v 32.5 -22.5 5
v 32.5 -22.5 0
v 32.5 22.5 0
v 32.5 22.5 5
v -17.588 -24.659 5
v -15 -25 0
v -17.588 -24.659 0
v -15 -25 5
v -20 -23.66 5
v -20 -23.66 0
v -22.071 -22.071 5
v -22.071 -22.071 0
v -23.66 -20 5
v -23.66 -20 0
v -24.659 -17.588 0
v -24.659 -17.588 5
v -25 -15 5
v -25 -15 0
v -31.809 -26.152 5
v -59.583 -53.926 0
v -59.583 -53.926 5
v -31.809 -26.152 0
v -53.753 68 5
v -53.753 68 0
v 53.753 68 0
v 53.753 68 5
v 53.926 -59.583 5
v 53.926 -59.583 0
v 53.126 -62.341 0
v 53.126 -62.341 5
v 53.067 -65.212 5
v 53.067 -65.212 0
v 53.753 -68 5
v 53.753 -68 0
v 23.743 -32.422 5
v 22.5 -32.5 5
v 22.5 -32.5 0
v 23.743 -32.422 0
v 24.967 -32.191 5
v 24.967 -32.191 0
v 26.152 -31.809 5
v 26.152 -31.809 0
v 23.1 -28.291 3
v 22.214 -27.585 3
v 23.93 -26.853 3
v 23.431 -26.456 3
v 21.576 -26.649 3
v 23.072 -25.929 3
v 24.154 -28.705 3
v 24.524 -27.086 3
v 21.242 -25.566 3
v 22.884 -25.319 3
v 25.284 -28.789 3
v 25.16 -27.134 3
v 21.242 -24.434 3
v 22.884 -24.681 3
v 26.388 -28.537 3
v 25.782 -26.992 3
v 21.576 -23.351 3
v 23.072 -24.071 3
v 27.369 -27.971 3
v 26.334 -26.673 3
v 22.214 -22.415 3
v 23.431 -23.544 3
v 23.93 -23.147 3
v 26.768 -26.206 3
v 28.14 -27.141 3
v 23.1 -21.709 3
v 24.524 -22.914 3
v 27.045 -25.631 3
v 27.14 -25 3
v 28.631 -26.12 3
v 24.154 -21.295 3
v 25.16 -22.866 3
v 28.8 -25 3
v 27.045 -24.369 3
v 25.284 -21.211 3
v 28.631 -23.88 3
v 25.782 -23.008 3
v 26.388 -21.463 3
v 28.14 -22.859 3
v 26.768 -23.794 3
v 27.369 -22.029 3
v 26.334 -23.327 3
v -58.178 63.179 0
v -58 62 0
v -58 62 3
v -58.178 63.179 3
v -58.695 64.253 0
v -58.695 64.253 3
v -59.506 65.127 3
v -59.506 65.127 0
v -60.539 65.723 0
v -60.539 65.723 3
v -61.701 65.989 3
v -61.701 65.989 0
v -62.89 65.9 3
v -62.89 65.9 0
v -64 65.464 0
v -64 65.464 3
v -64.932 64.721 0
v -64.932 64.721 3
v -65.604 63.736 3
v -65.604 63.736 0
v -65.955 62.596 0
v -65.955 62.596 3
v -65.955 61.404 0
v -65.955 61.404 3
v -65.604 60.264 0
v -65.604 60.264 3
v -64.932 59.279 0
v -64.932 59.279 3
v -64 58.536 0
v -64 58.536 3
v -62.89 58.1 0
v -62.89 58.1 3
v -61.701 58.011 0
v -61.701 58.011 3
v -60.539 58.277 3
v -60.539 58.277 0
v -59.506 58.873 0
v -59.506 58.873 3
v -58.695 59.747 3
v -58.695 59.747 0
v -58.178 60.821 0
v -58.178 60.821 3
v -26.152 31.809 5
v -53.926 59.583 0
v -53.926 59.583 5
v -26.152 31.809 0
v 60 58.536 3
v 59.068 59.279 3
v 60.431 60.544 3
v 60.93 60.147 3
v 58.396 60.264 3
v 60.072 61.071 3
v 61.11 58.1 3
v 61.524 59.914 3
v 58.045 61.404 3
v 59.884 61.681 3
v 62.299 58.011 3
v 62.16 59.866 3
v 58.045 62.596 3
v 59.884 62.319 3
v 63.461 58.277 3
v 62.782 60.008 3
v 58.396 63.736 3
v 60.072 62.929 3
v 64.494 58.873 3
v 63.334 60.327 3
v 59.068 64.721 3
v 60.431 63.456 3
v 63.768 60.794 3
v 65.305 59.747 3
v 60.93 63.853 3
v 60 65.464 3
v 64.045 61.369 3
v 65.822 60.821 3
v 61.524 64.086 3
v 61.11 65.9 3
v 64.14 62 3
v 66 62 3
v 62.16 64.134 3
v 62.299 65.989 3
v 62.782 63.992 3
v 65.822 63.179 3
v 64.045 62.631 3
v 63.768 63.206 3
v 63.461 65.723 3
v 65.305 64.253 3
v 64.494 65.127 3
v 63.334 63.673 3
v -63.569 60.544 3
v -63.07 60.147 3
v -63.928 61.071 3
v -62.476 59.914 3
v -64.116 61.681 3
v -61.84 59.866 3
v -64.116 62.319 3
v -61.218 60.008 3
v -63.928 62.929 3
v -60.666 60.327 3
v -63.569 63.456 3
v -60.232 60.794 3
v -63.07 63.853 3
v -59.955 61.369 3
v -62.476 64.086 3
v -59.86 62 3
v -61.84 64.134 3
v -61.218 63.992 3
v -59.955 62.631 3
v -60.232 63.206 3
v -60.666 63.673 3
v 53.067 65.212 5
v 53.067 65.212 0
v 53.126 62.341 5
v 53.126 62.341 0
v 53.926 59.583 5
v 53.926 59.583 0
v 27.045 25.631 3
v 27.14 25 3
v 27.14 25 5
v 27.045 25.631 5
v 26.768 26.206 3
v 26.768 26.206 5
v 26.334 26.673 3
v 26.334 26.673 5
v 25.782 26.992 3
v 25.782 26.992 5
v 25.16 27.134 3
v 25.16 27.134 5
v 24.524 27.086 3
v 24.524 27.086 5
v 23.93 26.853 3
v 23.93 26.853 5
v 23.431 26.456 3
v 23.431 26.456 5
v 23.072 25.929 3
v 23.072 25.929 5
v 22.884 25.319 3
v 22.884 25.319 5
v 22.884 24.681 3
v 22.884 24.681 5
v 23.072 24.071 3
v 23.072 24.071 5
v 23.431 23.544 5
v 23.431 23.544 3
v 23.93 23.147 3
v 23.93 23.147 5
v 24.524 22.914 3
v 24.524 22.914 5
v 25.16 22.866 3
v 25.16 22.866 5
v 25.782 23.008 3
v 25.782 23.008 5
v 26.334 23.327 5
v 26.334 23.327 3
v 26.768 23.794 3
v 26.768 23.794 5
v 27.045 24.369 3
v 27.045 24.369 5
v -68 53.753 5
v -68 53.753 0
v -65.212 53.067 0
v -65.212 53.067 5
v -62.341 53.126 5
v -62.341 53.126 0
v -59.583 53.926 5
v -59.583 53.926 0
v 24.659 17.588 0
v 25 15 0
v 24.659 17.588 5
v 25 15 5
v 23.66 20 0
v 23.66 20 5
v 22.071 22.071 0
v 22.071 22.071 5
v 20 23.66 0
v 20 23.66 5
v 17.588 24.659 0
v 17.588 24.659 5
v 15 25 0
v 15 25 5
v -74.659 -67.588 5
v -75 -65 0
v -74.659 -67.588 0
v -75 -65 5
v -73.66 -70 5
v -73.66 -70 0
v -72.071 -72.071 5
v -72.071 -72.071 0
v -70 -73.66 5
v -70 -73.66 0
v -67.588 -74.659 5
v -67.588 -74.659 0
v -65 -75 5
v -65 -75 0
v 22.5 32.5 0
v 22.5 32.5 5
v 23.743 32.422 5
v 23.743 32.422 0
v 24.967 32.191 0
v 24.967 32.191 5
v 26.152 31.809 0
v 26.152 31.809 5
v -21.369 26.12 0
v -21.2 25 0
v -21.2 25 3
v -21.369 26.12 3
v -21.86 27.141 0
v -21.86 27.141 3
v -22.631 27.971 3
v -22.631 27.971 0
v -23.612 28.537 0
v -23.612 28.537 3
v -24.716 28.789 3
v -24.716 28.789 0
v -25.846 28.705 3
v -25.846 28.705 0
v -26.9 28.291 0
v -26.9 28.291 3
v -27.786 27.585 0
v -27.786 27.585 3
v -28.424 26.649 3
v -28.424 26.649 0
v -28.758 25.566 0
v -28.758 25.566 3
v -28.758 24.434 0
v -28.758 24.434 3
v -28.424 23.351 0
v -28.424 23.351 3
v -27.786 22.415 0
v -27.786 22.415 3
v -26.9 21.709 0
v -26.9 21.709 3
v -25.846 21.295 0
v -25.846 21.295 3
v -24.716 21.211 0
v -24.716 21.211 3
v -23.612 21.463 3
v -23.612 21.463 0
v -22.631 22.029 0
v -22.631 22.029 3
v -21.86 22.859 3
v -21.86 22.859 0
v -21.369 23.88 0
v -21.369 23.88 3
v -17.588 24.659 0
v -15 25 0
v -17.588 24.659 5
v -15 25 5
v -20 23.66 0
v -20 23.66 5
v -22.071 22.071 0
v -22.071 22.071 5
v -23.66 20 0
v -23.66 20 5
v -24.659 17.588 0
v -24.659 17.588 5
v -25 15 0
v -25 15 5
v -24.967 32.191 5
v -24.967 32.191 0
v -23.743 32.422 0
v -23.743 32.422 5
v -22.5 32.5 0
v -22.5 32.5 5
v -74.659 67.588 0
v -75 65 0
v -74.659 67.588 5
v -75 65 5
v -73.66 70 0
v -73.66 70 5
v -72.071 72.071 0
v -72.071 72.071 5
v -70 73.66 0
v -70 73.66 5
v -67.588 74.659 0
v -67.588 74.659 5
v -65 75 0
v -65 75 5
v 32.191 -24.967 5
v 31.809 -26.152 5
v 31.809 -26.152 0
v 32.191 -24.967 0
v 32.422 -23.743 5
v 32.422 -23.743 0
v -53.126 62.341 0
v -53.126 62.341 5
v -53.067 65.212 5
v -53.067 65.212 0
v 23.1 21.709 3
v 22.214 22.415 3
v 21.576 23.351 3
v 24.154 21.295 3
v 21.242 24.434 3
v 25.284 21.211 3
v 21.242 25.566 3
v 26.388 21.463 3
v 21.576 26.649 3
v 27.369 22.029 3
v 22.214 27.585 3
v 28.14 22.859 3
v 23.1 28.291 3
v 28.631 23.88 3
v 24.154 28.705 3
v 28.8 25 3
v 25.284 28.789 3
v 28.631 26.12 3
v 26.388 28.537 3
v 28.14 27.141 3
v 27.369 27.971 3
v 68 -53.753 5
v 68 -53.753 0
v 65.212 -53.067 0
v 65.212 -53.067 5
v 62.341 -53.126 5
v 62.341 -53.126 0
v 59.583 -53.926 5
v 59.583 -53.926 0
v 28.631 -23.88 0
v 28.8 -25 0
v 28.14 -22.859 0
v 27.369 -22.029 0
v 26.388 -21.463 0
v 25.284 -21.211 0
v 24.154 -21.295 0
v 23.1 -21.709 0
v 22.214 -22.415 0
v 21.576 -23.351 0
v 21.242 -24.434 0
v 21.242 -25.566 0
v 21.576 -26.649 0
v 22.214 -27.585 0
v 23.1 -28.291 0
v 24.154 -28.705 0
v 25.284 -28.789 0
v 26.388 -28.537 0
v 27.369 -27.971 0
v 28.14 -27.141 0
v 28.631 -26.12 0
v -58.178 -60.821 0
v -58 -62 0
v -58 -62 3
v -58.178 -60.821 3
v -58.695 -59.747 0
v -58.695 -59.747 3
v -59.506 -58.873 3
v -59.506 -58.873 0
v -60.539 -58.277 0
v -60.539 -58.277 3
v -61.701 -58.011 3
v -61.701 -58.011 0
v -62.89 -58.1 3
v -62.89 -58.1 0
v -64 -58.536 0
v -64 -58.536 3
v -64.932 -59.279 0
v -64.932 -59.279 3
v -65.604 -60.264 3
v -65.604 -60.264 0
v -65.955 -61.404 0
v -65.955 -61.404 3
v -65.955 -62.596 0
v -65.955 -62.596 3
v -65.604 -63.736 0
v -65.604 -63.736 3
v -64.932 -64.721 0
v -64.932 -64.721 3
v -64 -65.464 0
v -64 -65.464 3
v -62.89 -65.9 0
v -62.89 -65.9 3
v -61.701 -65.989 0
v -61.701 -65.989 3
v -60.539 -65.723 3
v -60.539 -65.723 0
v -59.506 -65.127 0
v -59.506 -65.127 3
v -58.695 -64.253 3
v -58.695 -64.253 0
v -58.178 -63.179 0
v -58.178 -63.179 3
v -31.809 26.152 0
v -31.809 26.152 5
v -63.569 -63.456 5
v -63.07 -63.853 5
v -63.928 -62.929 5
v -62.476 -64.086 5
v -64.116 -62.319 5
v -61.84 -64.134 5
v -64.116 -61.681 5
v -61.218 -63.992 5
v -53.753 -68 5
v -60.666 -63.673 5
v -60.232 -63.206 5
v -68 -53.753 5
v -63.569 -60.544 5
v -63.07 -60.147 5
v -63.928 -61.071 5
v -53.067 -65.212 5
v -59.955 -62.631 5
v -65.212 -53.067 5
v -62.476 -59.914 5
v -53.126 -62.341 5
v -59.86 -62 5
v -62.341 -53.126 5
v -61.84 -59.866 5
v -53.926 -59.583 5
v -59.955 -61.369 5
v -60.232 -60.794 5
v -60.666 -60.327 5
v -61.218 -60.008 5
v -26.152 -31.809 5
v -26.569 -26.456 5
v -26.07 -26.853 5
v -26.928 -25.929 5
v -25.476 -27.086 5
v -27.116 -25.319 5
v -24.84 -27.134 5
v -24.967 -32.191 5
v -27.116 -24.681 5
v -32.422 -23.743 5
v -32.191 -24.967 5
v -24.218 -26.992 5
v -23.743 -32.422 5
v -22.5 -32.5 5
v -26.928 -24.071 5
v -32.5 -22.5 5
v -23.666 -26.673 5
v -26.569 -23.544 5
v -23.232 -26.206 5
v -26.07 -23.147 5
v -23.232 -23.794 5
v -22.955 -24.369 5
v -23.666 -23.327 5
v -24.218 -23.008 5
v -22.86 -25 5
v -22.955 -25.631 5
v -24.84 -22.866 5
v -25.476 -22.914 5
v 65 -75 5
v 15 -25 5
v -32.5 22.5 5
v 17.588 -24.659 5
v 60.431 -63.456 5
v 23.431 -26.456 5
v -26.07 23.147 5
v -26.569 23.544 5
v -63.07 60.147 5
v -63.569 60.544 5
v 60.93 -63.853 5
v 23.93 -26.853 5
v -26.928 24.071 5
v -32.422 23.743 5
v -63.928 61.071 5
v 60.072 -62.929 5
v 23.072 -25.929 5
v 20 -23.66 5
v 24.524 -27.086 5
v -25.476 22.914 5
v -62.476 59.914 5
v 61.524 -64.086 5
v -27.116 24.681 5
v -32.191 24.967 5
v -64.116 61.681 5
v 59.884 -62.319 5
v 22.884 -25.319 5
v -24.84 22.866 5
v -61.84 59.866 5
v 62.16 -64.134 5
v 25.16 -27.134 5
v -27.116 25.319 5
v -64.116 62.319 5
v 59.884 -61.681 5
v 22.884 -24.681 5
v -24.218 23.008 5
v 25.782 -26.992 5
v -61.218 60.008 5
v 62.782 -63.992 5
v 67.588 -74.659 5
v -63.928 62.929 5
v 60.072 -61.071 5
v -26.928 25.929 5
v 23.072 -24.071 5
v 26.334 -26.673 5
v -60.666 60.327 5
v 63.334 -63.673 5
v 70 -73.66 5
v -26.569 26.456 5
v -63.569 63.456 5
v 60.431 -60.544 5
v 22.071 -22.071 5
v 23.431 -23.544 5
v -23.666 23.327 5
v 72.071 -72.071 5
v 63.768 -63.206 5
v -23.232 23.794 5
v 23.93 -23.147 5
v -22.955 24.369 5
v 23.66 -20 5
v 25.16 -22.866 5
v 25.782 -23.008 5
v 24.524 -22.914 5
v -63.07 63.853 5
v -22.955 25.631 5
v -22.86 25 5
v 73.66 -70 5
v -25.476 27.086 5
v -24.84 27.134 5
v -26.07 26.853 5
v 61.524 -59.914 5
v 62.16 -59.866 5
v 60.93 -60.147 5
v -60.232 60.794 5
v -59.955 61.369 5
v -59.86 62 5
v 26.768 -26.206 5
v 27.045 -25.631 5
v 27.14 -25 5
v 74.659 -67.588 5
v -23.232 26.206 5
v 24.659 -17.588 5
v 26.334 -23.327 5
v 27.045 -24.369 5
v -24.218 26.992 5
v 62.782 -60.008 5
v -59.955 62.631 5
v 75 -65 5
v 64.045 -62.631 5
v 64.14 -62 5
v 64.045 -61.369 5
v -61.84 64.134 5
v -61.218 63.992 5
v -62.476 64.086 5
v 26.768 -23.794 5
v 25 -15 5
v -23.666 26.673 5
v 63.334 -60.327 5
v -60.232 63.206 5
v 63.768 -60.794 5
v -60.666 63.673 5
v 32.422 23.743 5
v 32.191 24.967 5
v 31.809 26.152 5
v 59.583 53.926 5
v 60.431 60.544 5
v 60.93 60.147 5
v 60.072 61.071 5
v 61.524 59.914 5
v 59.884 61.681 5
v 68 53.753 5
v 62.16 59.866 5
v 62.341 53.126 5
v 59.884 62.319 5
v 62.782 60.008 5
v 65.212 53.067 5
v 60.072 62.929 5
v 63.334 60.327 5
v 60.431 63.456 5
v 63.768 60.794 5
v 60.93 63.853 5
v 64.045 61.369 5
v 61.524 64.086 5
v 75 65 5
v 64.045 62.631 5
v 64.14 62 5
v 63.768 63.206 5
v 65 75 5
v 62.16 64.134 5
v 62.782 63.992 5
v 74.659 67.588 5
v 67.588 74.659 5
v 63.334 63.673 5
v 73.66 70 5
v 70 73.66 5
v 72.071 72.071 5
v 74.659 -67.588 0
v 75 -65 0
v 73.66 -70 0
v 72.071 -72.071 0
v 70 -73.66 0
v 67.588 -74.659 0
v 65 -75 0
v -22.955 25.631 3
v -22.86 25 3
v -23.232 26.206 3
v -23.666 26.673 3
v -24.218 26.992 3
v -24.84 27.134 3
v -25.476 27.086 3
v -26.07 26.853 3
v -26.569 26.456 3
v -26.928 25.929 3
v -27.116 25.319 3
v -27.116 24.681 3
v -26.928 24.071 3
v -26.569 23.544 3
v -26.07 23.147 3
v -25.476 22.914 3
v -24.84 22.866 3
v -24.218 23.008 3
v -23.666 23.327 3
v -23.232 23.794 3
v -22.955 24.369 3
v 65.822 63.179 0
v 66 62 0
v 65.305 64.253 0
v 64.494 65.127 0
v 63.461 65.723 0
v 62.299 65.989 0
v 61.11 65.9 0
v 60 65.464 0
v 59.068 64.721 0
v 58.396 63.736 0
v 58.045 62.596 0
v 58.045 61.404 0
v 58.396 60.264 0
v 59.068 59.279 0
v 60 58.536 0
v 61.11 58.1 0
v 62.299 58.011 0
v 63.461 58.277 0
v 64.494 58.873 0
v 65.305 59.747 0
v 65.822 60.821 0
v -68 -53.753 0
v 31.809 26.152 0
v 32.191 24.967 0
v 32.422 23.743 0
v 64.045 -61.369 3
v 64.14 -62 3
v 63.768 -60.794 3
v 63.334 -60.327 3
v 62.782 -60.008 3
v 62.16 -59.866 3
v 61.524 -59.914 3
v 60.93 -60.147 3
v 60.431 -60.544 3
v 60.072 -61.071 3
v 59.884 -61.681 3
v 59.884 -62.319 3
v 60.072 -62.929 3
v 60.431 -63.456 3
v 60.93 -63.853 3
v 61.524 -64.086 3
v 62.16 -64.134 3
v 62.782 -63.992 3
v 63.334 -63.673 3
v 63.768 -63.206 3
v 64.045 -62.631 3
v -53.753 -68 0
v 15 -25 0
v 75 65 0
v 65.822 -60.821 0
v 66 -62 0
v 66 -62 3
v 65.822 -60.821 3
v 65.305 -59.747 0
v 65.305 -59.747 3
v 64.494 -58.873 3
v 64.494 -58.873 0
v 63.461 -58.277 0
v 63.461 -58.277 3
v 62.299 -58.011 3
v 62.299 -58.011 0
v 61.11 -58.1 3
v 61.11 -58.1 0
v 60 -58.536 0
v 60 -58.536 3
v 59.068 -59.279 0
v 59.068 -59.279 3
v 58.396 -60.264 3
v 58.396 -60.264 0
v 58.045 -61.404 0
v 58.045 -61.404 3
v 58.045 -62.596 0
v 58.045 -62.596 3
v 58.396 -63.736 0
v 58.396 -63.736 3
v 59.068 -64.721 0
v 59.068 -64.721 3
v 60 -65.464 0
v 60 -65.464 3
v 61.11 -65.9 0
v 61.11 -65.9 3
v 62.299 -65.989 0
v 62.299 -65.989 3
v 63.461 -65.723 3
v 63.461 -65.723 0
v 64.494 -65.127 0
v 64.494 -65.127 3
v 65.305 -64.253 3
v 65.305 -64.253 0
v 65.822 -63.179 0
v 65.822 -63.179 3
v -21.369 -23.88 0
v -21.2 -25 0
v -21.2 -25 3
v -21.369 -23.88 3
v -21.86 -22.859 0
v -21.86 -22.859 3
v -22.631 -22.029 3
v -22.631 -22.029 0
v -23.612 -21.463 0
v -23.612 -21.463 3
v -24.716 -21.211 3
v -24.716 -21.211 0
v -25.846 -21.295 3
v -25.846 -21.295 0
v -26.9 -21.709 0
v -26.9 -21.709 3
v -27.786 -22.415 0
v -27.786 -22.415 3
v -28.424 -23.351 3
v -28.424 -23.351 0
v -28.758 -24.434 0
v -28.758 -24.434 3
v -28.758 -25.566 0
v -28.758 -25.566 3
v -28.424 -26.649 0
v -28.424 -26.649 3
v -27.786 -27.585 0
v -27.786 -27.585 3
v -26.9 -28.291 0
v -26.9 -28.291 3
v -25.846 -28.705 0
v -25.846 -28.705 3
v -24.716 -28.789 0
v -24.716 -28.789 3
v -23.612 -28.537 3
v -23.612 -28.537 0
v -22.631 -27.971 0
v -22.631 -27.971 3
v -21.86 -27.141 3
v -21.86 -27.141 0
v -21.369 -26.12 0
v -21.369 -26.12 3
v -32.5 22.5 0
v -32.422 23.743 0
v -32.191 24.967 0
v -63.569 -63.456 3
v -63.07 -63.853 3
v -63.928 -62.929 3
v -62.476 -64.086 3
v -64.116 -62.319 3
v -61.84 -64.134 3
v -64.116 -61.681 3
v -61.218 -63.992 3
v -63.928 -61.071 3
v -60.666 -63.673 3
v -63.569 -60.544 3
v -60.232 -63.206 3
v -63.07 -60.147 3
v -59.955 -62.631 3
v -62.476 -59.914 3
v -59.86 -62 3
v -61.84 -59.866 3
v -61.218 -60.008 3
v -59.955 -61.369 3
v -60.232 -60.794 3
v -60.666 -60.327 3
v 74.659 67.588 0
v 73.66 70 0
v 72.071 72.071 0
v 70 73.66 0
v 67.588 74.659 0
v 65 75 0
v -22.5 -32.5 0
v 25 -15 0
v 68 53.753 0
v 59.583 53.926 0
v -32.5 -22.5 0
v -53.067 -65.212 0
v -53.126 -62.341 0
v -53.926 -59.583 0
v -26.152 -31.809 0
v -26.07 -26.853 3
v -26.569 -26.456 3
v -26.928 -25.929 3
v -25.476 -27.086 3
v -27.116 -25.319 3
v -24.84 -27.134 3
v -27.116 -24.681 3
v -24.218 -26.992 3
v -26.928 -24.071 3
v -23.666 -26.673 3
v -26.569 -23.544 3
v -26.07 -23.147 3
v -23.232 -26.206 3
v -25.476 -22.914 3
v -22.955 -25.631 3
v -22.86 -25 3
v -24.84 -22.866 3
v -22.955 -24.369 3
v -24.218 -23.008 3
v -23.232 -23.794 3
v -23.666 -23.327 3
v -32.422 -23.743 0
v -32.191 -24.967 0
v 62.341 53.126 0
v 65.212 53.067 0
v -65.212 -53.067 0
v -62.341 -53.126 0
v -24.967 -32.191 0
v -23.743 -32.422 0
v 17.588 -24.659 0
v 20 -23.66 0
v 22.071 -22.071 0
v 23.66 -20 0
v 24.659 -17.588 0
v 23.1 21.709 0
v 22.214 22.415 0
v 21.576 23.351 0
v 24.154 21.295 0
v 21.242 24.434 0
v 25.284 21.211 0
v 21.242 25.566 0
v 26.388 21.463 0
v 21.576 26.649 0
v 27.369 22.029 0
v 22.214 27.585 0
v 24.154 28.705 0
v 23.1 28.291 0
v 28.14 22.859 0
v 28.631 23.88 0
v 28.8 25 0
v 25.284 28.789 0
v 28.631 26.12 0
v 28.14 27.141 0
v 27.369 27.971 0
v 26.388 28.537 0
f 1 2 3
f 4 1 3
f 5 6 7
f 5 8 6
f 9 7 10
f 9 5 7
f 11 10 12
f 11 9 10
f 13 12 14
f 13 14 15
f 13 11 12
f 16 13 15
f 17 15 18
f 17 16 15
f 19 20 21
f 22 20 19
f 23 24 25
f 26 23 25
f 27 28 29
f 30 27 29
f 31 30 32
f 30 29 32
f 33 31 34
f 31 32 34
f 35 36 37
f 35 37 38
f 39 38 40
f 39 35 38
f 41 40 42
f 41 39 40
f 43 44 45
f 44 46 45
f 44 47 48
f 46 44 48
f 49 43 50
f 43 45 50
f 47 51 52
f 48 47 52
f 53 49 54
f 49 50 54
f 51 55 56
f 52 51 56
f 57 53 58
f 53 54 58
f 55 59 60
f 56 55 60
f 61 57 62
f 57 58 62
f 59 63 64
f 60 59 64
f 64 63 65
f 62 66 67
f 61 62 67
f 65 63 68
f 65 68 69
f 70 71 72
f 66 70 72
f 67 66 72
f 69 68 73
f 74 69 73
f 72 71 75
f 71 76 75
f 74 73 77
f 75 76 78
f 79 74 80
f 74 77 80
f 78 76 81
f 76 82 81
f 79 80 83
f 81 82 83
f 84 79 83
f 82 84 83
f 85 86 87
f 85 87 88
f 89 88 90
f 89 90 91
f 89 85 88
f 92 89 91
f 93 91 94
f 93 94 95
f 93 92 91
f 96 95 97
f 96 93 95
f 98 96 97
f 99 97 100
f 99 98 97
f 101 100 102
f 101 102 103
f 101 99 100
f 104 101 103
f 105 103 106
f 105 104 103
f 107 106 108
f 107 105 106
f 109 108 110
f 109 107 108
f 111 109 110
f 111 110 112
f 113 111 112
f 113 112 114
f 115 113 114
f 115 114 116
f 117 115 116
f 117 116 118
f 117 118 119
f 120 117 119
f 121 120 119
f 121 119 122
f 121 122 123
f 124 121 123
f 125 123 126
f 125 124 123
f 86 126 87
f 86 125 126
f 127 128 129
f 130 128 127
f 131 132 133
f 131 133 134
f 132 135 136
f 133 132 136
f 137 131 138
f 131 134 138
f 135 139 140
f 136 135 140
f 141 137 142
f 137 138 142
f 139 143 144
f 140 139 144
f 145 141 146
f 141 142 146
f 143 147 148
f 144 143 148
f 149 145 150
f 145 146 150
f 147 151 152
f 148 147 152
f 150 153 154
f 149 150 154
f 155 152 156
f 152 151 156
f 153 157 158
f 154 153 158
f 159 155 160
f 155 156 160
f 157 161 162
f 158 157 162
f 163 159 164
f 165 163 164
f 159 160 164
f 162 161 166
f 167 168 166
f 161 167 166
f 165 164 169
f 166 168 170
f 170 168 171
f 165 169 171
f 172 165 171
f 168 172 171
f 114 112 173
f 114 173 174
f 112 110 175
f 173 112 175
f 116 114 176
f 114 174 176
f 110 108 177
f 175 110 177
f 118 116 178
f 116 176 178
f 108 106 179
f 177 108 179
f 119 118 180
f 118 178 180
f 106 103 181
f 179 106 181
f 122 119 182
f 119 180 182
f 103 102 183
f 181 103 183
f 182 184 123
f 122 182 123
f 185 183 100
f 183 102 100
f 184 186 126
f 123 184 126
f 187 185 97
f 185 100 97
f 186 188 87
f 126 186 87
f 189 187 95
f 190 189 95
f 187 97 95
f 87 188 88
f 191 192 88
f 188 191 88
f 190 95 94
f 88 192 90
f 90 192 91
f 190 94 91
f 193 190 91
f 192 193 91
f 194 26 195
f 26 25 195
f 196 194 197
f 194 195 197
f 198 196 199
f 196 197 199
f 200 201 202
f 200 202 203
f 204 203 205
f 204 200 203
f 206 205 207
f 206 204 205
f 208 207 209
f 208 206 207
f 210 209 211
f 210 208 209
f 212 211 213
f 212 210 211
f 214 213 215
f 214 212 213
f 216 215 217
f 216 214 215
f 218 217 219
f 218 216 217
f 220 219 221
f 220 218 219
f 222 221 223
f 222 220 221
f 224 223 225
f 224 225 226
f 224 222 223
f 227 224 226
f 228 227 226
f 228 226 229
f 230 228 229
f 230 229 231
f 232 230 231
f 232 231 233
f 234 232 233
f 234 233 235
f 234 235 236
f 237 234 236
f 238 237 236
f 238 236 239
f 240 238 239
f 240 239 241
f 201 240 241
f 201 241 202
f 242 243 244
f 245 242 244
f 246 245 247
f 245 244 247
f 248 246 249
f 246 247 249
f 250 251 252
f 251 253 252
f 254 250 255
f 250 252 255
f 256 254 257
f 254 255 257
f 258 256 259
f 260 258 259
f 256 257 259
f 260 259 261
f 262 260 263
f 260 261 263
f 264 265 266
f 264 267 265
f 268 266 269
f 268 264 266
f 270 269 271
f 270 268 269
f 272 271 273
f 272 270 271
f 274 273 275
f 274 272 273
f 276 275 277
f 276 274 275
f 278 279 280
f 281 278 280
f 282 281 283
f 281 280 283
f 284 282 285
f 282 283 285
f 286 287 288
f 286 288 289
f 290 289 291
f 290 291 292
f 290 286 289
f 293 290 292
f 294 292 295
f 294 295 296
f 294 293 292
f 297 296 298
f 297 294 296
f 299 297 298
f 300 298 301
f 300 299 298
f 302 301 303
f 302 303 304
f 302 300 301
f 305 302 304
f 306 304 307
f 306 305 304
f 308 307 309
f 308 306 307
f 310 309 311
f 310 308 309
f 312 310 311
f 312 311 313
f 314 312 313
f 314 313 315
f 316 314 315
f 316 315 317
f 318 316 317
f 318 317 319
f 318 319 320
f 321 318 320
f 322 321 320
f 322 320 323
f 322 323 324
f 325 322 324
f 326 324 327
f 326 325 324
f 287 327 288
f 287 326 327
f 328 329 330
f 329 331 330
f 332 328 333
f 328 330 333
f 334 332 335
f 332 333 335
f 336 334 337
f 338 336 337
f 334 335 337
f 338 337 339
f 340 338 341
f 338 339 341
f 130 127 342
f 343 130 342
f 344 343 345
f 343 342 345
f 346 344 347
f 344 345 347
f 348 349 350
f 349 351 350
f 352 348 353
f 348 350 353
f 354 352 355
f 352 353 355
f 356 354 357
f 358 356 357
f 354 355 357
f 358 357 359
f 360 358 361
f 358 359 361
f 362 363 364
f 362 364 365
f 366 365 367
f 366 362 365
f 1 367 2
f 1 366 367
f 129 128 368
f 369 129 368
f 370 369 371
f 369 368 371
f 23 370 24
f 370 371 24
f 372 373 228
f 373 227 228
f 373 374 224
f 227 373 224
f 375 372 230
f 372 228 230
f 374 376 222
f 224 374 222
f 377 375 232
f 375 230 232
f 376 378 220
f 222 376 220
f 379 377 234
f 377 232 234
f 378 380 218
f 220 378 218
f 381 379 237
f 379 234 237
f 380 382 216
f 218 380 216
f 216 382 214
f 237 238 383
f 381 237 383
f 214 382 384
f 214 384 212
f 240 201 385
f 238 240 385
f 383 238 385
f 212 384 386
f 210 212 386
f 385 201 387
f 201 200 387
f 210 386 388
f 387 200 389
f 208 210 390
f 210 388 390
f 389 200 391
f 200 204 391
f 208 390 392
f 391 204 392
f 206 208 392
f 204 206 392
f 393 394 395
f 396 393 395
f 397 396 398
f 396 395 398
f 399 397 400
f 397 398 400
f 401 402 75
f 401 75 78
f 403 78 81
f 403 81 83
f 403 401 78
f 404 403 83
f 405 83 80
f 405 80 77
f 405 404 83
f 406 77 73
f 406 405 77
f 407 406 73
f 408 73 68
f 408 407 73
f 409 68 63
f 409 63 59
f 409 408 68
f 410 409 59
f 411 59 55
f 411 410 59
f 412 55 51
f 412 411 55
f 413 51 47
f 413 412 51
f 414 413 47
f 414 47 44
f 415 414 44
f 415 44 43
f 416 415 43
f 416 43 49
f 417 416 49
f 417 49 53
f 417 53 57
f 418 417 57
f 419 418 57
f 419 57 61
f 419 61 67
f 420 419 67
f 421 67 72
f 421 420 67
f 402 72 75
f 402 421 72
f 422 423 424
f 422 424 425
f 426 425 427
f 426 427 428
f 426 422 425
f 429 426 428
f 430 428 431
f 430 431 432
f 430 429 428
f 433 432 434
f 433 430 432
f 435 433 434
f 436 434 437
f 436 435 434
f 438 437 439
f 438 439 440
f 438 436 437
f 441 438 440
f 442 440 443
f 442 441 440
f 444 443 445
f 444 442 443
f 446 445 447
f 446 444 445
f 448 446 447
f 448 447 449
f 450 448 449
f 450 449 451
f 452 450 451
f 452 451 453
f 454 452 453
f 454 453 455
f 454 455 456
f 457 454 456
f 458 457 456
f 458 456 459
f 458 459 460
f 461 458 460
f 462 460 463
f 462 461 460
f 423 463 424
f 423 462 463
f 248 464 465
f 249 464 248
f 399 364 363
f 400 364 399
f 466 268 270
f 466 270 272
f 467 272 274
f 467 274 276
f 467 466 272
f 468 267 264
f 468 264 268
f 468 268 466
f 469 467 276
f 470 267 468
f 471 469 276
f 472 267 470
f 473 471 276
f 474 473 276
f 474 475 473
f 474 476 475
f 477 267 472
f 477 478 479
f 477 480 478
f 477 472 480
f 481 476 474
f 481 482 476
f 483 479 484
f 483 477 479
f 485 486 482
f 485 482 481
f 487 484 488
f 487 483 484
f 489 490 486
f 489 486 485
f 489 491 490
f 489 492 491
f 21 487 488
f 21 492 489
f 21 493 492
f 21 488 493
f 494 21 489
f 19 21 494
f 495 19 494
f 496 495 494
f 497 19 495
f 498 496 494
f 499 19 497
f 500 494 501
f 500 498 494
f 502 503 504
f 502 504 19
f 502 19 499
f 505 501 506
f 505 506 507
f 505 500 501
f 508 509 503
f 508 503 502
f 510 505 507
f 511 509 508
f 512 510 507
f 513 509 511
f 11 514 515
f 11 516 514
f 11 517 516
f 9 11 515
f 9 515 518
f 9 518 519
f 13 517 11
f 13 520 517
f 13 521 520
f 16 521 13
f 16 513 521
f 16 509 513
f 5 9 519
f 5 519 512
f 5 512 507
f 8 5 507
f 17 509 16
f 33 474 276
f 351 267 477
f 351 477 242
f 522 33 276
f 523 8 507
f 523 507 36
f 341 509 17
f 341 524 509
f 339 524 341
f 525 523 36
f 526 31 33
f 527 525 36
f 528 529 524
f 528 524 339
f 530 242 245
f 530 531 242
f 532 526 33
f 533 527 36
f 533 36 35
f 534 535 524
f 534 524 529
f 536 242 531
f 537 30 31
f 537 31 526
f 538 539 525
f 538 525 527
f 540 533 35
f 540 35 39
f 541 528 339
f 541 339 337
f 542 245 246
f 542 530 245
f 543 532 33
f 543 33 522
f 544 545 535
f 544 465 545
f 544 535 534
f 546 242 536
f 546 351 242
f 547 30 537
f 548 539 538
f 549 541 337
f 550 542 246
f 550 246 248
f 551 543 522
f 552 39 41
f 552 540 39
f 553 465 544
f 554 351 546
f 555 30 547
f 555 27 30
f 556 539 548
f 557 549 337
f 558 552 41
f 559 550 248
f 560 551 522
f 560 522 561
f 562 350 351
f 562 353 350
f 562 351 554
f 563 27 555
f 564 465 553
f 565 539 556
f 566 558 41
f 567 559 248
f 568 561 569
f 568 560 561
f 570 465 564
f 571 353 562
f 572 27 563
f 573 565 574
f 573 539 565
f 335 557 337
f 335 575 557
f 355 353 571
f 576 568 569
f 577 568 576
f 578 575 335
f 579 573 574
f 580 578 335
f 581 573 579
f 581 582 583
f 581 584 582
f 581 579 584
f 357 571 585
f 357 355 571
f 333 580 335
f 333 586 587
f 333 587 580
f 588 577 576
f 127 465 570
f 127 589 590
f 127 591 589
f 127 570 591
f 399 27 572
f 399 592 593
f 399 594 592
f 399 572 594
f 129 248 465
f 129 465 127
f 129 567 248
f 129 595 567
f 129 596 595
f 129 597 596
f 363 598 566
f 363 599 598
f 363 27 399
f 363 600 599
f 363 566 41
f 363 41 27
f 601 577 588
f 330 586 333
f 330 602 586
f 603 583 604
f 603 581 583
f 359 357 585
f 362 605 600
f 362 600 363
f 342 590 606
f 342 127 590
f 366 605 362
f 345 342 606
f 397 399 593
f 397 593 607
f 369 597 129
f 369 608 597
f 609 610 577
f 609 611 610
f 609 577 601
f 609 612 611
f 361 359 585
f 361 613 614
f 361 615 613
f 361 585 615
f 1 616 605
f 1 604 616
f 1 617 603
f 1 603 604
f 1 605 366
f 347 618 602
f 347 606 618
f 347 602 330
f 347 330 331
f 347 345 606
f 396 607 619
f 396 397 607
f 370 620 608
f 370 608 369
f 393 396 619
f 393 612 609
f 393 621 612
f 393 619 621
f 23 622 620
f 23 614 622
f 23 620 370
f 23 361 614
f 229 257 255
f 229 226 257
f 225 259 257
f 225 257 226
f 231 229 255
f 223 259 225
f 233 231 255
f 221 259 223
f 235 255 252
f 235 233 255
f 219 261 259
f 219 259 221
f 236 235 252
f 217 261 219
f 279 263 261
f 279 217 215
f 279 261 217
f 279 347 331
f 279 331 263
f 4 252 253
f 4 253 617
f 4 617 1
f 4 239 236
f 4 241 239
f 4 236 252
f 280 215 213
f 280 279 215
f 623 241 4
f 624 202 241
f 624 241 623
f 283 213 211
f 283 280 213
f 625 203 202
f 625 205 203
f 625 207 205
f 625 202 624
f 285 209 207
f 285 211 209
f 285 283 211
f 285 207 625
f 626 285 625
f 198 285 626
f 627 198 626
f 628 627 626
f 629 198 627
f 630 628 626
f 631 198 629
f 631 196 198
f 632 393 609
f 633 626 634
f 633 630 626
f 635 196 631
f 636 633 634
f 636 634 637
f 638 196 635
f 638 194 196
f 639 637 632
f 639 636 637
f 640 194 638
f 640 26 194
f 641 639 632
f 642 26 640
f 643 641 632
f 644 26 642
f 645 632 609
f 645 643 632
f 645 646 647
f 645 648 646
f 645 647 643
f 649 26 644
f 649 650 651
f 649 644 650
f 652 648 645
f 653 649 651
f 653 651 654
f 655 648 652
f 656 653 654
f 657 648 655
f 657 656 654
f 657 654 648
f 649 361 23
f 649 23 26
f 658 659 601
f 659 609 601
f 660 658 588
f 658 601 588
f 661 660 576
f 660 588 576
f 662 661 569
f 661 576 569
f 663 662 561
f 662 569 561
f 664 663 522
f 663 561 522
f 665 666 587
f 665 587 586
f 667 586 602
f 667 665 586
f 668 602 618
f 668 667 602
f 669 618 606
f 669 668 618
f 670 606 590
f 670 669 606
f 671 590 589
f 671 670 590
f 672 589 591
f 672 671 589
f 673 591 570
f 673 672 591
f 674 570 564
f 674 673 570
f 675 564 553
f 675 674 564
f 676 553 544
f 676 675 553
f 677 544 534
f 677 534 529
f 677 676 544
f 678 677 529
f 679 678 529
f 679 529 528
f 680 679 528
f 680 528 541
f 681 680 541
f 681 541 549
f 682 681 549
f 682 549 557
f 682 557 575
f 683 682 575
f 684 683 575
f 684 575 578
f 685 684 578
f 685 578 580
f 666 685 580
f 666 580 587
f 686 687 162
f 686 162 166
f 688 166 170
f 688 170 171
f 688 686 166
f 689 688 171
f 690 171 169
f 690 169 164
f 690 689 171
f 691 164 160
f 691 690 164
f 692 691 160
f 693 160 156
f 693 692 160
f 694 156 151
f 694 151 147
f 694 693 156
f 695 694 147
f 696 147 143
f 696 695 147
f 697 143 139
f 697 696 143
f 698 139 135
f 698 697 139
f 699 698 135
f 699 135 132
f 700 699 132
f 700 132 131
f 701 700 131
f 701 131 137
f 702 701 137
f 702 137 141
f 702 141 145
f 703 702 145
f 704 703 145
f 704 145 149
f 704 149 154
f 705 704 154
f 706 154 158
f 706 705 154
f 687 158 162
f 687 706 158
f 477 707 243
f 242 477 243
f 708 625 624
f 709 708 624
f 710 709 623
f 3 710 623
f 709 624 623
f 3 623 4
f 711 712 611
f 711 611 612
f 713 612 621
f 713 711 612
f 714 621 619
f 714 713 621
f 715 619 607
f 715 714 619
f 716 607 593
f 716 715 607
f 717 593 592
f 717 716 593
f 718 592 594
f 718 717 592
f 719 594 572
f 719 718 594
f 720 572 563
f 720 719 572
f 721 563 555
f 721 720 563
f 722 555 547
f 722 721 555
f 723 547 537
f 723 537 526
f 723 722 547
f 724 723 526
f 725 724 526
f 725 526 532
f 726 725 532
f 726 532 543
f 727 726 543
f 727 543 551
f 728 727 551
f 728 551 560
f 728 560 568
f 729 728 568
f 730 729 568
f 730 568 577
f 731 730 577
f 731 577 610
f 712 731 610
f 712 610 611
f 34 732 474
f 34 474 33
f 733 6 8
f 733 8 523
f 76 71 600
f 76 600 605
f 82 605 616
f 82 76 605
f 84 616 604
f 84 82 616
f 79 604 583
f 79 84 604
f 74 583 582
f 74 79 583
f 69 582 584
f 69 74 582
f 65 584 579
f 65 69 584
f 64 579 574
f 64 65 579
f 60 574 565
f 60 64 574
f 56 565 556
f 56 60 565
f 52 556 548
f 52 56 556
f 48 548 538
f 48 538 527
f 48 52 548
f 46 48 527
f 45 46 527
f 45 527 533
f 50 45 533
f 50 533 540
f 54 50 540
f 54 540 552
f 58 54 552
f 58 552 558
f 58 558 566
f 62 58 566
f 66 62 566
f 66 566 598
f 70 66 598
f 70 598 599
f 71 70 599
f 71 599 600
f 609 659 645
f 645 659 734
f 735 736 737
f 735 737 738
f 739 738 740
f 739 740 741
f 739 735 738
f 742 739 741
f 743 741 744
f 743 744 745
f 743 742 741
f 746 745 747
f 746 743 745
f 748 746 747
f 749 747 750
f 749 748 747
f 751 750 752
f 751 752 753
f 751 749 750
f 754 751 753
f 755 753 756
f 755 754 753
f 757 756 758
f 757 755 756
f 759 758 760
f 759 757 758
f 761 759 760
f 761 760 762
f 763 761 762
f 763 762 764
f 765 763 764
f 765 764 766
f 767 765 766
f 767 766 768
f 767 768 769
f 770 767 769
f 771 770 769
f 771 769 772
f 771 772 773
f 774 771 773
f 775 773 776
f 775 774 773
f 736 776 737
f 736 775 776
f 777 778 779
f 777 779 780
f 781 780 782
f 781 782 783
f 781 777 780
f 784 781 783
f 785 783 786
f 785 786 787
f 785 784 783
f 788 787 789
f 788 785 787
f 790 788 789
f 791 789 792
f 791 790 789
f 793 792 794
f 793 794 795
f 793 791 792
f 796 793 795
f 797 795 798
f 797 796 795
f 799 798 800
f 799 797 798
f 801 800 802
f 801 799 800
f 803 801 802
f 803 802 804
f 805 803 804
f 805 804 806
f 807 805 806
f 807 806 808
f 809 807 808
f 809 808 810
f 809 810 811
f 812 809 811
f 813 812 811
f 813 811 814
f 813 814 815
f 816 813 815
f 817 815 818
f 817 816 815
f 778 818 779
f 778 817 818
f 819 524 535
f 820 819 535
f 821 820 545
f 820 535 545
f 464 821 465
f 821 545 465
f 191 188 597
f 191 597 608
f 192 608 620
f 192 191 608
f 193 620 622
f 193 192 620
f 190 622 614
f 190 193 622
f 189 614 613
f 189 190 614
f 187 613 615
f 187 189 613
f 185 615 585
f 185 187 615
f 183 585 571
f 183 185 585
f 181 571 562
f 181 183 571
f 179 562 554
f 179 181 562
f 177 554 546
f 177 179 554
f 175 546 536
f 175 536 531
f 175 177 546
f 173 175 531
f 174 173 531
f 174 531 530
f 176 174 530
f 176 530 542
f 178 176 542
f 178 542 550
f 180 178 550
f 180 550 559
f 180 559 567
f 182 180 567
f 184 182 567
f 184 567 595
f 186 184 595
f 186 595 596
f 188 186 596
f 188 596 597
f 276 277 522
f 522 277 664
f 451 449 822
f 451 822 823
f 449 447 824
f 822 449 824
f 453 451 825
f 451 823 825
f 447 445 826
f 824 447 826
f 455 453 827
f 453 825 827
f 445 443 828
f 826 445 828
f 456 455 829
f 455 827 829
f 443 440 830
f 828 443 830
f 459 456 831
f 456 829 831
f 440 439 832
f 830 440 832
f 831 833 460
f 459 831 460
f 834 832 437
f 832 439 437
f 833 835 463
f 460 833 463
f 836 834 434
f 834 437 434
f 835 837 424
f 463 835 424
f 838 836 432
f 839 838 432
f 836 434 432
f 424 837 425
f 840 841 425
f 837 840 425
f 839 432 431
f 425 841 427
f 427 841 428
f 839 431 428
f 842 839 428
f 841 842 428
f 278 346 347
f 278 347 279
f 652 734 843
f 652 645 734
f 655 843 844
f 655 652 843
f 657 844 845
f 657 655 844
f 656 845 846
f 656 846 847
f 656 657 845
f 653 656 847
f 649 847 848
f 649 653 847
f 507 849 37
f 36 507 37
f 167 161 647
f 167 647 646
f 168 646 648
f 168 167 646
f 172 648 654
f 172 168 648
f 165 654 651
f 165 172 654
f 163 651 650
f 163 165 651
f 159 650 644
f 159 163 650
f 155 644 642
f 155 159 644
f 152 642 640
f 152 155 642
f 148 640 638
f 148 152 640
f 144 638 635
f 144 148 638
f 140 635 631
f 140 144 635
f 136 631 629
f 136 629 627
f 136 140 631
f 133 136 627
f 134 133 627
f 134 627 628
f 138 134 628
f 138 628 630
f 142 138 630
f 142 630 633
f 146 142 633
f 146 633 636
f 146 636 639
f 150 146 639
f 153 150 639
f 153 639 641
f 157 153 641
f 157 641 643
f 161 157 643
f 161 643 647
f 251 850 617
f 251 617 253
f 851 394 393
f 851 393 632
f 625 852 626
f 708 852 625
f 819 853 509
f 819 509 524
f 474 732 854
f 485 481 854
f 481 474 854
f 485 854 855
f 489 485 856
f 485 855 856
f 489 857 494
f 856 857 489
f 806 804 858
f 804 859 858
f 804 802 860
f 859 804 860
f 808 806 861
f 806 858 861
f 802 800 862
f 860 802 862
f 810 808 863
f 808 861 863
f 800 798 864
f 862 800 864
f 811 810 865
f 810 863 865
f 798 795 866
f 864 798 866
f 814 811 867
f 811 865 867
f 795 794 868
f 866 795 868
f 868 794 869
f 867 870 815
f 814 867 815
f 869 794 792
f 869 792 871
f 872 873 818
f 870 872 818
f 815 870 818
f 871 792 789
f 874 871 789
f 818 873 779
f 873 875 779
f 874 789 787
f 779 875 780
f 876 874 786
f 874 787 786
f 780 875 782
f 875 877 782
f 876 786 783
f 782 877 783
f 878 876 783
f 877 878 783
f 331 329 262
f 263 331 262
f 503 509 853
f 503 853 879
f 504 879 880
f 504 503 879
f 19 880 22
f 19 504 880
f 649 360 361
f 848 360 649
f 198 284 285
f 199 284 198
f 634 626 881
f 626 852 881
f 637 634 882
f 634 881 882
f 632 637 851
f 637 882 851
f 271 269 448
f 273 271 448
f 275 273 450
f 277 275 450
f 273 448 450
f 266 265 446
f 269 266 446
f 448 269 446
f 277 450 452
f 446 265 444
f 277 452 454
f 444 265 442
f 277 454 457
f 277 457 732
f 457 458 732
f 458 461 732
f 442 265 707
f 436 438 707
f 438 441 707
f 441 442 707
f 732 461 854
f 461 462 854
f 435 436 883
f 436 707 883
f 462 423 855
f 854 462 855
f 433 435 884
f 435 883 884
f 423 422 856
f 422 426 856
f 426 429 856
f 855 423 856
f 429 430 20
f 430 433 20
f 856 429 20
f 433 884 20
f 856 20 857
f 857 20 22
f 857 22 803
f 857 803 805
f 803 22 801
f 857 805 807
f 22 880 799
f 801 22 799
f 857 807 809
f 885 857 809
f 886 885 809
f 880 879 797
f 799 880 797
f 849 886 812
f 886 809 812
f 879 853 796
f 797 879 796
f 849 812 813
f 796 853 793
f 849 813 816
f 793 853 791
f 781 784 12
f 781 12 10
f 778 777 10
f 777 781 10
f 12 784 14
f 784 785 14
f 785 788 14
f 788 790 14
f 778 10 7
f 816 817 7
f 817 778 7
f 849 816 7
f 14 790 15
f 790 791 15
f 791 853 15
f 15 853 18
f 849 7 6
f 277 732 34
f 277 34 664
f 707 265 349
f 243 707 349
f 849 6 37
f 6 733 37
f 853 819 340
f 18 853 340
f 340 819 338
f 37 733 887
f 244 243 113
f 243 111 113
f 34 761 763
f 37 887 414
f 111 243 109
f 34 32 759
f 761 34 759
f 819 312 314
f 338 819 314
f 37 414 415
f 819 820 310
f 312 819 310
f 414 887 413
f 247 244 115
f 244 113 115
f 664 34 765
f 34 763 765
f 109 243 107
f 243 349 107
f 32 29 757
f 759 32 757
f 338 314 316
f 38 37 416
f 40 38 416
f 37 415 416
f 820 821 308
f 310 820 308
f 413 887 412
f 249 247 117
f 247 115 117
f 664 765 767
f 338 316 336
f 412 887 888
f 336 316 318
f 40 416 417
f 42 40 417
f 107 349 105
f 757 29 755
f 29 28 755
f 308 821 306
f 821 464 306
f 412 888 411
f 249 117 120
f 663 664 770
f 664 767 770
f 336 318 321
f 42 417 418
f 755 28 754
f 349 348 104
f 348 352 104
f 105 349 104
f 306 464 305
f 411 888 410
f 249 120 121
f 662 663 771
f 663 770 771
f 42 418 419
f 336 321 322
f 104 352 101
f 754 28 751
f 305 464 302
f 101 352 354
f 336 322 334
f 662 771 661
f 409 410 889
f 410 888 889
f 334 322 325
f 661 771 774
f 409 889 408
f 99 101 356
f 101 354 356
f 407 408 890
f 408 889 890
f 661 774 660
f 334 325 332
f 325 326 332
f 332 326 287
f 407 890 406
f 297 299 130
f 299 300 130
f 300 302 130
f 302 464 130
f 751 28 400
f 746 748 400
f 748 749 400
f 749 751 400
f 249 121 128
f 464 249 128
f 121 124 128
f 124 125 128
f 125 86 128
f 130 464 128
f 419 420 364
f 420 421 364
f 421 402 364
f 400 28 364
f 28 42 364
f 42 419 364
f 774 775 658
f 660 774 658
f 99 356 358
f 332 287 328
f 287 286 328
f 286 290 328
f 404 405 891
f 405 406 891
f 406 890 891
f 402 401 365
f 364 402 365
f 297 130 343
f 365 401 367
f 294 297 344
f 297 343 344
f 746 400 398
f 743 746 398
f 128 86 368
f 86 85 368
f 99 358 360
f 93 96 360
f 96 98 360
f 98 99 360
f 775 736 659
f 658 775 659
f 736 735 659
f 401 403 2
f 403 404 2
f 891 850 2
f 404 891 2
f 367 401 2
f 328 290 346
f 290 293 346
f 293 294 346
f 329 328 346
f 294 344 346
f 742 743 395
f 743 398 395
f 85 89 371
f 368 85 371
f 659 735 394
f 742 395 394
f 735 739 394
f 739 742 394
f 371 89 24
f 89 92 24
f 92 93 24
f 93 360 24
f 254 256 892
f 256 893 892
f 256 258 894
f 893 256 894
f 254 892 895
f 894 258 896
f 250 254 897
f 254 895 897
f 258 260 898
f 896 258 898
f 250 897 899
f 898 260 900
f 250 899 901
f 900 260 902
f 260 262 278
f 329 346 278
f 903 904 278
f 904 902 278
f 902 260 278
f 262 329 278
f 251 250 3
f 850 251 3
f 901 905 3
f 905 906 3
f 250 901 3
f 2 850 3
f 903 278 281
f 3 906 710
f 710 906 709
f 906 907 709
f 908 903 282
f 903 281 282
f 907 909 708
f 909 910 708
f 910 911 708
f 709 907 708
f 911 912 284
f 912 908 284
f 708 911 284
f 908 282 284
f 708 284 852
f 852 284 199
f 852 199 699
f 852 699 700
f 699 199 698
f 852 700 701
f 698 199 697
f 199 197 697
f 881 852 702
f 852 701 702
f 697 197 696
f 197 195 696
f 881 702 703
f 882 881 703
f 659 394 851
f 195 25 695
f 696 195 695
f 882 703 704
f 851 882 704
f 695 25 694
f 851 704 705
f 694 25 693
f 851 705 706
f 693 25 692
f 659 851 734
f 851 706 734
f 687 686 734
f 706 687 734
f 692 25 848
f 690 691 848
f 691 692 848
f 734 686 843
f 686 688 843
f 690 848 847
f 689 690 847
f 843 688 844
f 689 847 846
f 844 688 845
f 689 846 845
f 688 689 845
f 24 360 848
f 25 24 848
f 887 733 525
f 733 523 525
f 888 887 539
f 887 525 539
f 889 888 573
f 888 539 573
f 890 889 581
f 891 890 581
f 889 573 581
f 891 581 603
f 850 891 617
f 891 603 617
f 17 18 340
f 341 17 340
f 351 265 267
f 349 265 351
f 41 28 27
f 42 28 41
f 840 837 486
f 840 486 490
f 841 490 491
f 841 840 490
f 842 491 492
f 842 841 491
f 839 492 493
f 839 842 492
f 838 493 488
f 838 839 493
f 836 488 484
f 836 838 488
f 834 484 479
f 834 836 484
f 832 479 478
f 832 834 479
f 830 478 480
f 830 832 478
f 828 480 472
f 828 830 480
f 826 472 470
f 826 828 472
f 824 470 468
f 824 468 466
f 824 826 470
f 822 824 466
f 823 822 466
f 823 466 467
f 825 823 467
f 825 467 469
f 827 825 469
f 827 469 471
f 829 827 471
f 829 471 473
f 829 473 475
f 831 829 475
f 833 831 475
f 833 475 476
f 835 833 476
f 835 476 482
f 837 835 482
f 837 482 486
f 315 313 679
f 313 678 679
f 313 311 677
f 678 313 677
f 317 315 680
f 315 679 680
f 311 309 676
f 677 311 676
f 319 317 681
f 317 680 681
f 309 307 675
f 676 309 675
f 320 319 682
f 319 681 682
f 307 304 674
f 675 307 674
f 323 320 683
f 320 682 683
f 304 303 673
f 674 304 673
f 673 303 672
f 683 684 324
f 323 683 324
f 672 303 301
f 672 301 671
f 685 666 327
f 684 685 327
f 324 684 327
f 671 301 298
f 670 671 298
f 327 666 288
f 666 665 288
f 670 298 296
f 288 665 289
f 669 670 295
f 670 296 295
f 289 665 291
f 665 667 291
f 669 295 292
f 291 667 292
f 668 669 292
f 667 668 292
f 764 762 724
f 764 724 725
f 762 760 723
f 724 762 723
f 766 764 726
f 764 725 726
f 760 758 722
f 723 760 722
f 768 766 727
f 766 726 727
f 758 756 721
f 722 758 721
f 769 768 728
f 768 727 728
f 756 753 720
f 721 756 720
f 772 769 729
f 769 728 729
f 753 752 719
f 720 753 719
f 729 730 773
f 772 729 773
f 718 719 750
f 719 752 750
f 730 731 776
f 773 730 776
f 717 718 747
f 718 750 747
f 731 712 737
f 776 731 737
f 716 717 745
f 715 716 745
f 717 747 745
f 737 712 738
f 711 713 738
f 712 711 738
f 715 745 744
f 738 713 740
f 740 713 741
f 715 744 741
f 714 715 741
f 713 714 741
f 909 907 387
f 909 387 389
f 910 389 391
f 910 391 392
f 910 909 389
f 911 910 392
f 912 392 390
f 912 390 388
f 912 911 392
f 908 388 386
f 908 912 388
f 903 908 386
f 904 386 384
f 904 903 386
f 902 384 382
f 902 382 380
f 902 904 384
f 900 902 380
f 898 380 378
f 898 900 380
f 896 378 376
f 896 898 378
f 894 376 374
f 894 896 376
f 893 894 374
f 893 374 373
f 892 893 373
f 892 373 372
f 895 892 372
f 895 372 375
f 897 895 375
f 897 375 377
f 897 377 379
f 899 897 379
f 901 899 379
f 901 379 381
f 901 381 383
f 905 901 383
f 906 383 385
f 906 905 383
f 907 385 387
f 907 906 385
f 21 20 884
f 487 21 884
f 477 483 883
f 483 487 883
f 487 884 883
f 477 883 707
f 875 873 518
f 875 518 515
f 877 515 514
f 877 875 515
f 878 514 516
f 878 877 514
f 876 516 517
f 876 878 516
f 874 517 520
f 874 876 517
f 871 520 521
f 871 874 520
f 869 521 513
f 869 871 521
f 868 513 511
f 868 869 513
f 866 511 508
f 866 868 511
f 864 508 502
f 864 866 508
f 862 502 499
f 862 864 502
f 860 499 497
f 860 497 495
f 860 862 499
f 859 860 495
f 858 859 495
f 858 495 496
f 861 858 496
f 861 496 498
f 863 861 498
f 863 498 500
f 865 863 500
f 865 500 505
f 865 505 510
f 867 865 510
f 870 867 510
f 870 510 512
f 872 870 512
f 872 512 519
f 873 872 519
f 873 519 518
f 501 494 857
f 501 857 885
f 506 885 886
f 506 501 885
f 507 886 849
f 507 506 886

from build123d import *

# Parameters (mm, degrees)
SKETCH1_R             = 11
BOSS_EXTRUDE1_DEPTH   = 5
BOSS_EXTRUDE1_2_DEPTH = 5
BOSS_EXTRUDE1_3_DEPTH = 5
BOSS_EXTRUDE1_4_DEPTH = 5
SKETCH3_W             = 150
SKETCH3_H             = 150
SKETCH3_W_2           = 136
SKETCH3_H_2           = 136
BOSS_EXTRUDE3_DEPTH   = 5
SKETCH8_R             = 2.14
BOSS_EXTRUDE4_DEPTH   = 5
BOSS_EXTRUDE4_2_DEPTH = 5
BOSS_EXTRUDE4_3_DEPTH = 5
BOSS_EXTRUDE4_4_DEPTH = 5
FILLET1_R             = 10
SKETCH9_R             = 4
BOSS_EXTRUDE5_DEPTH   = 3
BOSS_EXTRUDE5_2_DEPTH = 3
BOSS_EXTRUDE5_3_DEPTH = 3
BOSS_EXTRUDE5_4_DEPTH = 3
SKETCH10_W            = 65
SKETCH10_H            = 65
SKETCH10_W_2          = 50
SKETCH10_H_2          = 50
BOSS_EXTRUDE6_DEPTH   = 5
FILLET2_R             = 10
SKETCH11_R            = 2.14
BOSS_EXTRUDE7_DEPTH   = 5
BOSS_EXTRUDE7_2_DEPTH = 5
BOSS_EXTRUDE7_3_DEPTH = 5
BOSS_EXTRUDE7_4_DEPTH = 5
SKETCH12_R            = 3.8
BOSS_EXTRUDE8_DEPTH   = 3
BOSS_EXTRUDE8_2_DEPTH = 3
BOSS_EXTRUDE8_3_DEPTH = 3
BOSS_EXTRUDE8_4_DEPTH = 3
BOSS_EXTRUDE9_DEPTH   = 5
BOSS_EXTRUDE9_2_DEPTH = 5
BOSS_EXTRUDE9_3_DEPTH = 5
BOSS_EXTRUDE9_4_DEPTH = 5


with BuildPart() as part:
    # Sketch1 → Boss-Extrude1 (new body)
    with BuildSketch(Plane.XY):
        with Locations((-64, -64)):
            Circle(SKETCH1_R)
    extrude(amount=BOSS_EXTRUDE1_DEPTH)


with BuildPart() as body_2:
    # Sketch1 → Boss-Extrude1 2 (new body)
    with BuildSketch(Plane.XY):
        with Locations((-64, 64)):
            Circle(SKETCH1_R)
    extrude(amount=BOSS_EXTRUDE1_2_DEPTH)



with BuildPart() as body_3:
    # Sketch1 → Boss-Extrude1 3 (new body)
    with BuildSketch(Plane.XY):
        with Locations((64, -64)):
            Circle(SKETCH1_R)
    extrude(amount=BOSS_EXTRUDE1_3_DEPTH)


with BuildPart() as body_4:
    # Sketch1 → Boss-Extrude1 4 (new body)
    with BuildSketch(Plane.XY):
        with Locations((64, 64)):
            Circle(SKETCH1_R)
    extrude(amount=BOSS_EXTRUDE1_4_DEPTH)


with BuildPart() as body_2_1:
    add(body_2.part)

    add(body_3.part)  # Boss-Extrude3 merges body 3

    add(body_4.part)  # Boss-Extrude3 merges body 4
    # Sketch3 → Boss-Extrude3 (add)
    with BuildSketch(Plane.XY):
        Rectangle(SKETCH3_W, SKETCH3_H)
        Rectangle(SKETCH3_W_2, SKETCH3_H_2, mode=Mode.SUBTRACT)
    extrude(amount=BOSS_EXTRUDE3_DEPTH)

    # Fillet1
    fillet1_edges = [body_2_1.edges().sort_by_distance(p)[0] for p in [
        (75, -75, 2.5),
        (75, 75, 2.5),
        (-75, 75, 2.5),
        (-75, -75, 2.5),
    ]]
    fillet(fillet1_edges, radius=FILLET1_R)

    # Combine1: union part
    add(part.part)


with BuildPart() as body_3_2:
    # Sketch8 → Boss-Extrude4 (new body)
    with BuildSketch(Plane.XY):
        with Locations((-62, 62)):
            Circle(SKETCH8_R)
    extrude(amount=BOSS_EXTRUDE4_DEPTH)


with BuildPart() as body_4_2:
    # Sketch8 → Boss-Extrude4 2 (new body)
    with BuildSketch(Plane.XY):
        with Locations((-62, -62)):
            Circle(SKETCH8_R)
    extrude(amount=BOSS_EXTRUDE4_2_DEPTH)


with BuildPart() as body_5:
    # Sketch8 → Boss-Extrude4 3 (new body)
    with BuildSketch(Plane.XY):
        with Locations((62, 62)):
            Circle(SKETCH8_R)
    extrude(amount=BOSS_EXTRUDE4_3_DEPTH)


with BuildPart() as body_6:
    # Sketch8 → Boss-Extrude4 4 (new body)
    with BuildSketch(Plane.XY):
        with Locations((62, -62)):
            Circle(SKETCH8_R)
    extrude(amount=BOSS_EXTRUDE4_4_DEPTH)


with BuildPart() as body_6_2:
    # Sketch9 → Boss-Extrude5 (new body)
    with BuildSketch(Plane.XY):
        with Locations((-62, 62)):
            Circle(SKETCH9_R)
    extrude(amount=BOSS_EXTRUDE5_DEPTH)


with BuildPart() as body_7:
    # Sketch9 → Boss-Extrude5 2 (new body)
    with BuildSketch(Plane.XY):
        with Locations((-62, -62)):
            Circle(SKETCH9_R)
    extrude(amount=BOSS_EXTRUDE5_2_DEPTH)


with BuildPart() as body_8:
    # Sketch9 → Boss-Extrude5 3 (new body)
    with BuildSketch(Plane.XY):
        with Locations((62, 62)):
            Circle(SKETCH9_R)
    extrude(amount=BOSS_EXTRUDE5_3_DEPTH)


with BuildPart() as body_9:
    # Sketch9 → Boss-Extrude5 4 (new body)
    with BuildSketch(Plane.XY):
        with Locations((62, -62)):
            Circle(SKETCH9_R)
    extrude(amount=BOSS_EXTRUDE5_4_DEPTH)


with BuildPart() as body_10:
    # Sketch10 → Boss-Extrude6 (new body)
    with BuildSketch(Plane.XY):
        Rectangle(SKETCH10_W, SKETCH10_H)
        Rectangle(SKETCH10_W_2, SKETCH10_H_2, mode=Mode.SUBTRACT)
    extrude(amount=BOSS_EXTRUDE6_DEPTH)

    # Fillet2
    fillet2_edges = [body_10.edges().sort_by_distance(p)[0] for p in [
        (-25, -25, 2.5),
        (25, -25, 2.5),
        (-25, 25, 2.5),
        (25, 25, 2.5),
        (32.5, -32.5, 2.5),
        (-32.5, -32.5, 2.5),
        (-32.5, 32.5, 2.5),
        (32.5, 32.5, 2.5),
    ]]
    fillet(fillet2_edges, radius=FILLET2_R)


with BuildPart() as body_11:
    # Sketch11 → Boss-Extrude7 (new body)
    with BuildSketch(Plane.XY):
        with Locations((25, 25)):
            Circle(SKETCH11_R)
    extrude(amount=BOSS_EXTRUDE7_DEPTH)


with BuildPart() as body_12:
    # Sketch11 → Boss-Extrude7 2 (new body)
    with BuildSketch(Plane.XY):
        with Locations((-25, 25)):
            Circle(SKETCH11_R)
    extrude(amount=BOSS_EXTRUDE7_2_DEPTH)


with BuildPart() as body_13:
    # Sketch11 → Boss-Extrude7 3 (new body)
    with BuildSketch(Plane.XY):
        with Locations((-25, -25)):
            Circle(SKETCH11_R)
    extrude(amount=BOSS_EXTRUDE7_3_DEPTH)


with BuildPart() as body_14:
    # Sketch11 → Boss-Extrude7 4 (new body)
    with BuildSketch(Plane.XY):
        with Locations((25, -25)):
            Circle(SKETCH11_R)
    extrude(amount=BOSS_EXTRUDE7_4_DEPTH)


with BuildPart() as body_15:
    # Sketch12 → Boss-Extrude8 (new body)
    with BuildSketch(Plane.XY):
        with Locations((25, 25)):
            Circle(SKETCH12_R)
    extrude(amount=BOSS_EXTRUDE8_DEPTH)


with BuildPart() as body_16:
    # Sketch12 → Boss-Extrude8 2 (new body)
    with BuildSketch(Plane.XY):
        with Locations((-25, 25)):
            Circle(SKETCH12_R)
    extrude(amount=BOSS_EXTRUDE8_2_DEPTH)


with BuildPart() as body_17:
    # Sketch12 → Boss-Extrude8 3 (new body)
    with BuildSketch(Plane.XY):
        with Locations((-25, -25)):
            Circle(SKETCH12_R)
    extrude(amount=BOSS_EXTRUDE8_3_DEPTH)


with BuildPart() as body_18:
    # Sketch12 → Boss-Extrude8 4 (new body)
    with BuildSketch(Plane.XY):
        with Locations((25, -25)):
            Circle(SKETCH12_R)
    extrude(amount=BOSS_EXTRUDE8_4_DEPTH)


with BuildPart() as body_19:
    # Sketch14 → Boss-Extrude9 (new body)
    with BuildSketch(Plane.XY):
        with BuildLine():
            Line((-59.171572875, 64.828427125), (-22.171572875, 27.828427125))
            ThreePointArc((-22.171572875, 27.828427125), (-22.171572875, 22.171572875), (-27.828427125, 22.171572875))
            Line((-27.828427125, 22.171572875), (-64.828427125, 59.171572875))
            ThreePointArc((-64.828427125, 59.171572875), (-64.828427125, 64.828427125), (-59.171572875, 64.828427125))
        make_face()
    extrude(amount=BOSS_EXTRUDE9_DEPTH)


with BuildPart() as body_20:
    # Sketch14 → Boss-Extrude9 2 (new body)
    with BuildSketch(Plane.XY):
        with BuildLine():
            Line((64.828427125, 59.171572875), (27.828427125, 22.171572875))
            ThreePointArc((27.828427125, 22.171572875), (22.171572875, 22.171572875), (22.171572875, 27.828427125))
            Line((22.171572875, 27.828427125), (59.171572875, 64.828427125))
            ThreePointArc((59.171572875, 64.828427125), (64.828427125, 64.828427125), (64.828427125, 59.171572875))
        make_face()
    extrude(amount=BOSS_EXTRUDE9_2_DEPTH)


with BuildPart() as body_21:
    # Sketch14 → Boss-Extrude9 3 (new body)
    with BuildSketch(Plane.XY):
        with BuildLine():
            Line((27.828427125, -22.171572875), (64.828427125, -59.171572875))
            ThreePointArc((64.828427125, -59.171572875), (64.828427125, -64.828427125), (59.171572875, -64.828427125))
            Line((59.171572875, -64.828427125), (22.171572875, -27.828427125))
            ThreePointArc((22.171572875, -27.828427125), (22.171572875, -22.171572875), (27.828427125, -22.171572875))
        make_face()
    extrude(amount=BOSS_EXTRUDE9_3_DEPTH)


with BuildPart() as body_22:
    # Sketch14 → Boss-Extrude9 4 (new body)
    with BuildSketch(Plane.XY):
        with BuildLine():
            Line((-22.171572875, -27.828427125), (-59.171572875, -64.828427125))
            ThreePointArc((-59.171572875, -64.828427125), (-64.828427125, -64.828427125), (-64.828427125, -59.171572875))
            Line((-64.828427125, -59.171572875), (-27.828427125, -22.171572875))
            ThreePointArc((-27.828427125, -22.171572875), (-22.171572875, -22.171572875), (-22.171572875, -27.828427125))
        make_face()
    extrude(amount=BOSS_EXTRUDE9_4_DEPTH)

    # Combine4: union body 21, body 20, body 19, body 2, body 10
    add(body_21.part)
    add(body_20.part)
    add(body_19.part)
    add(body_2_1.part)
    add(body_10.part)

    # Combine5: cut body 15, body 18, body 17, body 16, body 11, body 14, body 13, body 12, body 9, body 6 2, body 8, body 7, body 6, body 3 2, body 5, body 4 2
    add(body_15.part, mode=Mode.SUBTRACT)
    add(body_18.part, mode=Mode.SUBTRACT)
    add(body_17.part, mode=Mode.SUBTRACT)
    add(body_16.part, mode=Mode.SUBTRACT)
    add(body_11.part, mode=Mode.SUBTRACT)
    add(body_14.part, mode=Mode.SUBTRACT)
    add(body_13.part, mode=Mode.SUBTRACT)
    add(body_12.part, mode=Mode.SUBTRACT)
    add(body_9.part, mode=Mode.SUBTRACT)
    add(body_6_2.part, mode=Mode.SUBTRACT)
    add(body_8.part, mode=Mode.SUBTRACT)
    add(body_7.part, mode=Mode.SUBTRACT)
    add(body_6.part, mode=Mode.SUBTRACT)
    add(body_3_2.part, mode=Mode.SUBTRACT)
    add(body_5.part, mode=Mode.SUBTRACT)
    add(body_4_2.part, mode=Mode.SUBTRACT)


solid = body_22.part
